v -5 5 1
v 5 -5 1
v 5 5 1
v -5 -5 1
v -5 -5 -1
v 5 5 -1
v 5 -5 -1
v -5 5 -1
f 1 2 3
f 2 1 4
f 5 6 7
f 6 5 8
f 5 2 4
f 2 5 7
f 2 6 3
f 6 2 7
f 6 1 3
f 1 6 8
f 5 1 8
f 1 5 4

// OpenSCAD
// Selftest fixture for scripts/lineage.sh — never printed, never gated as a
// design. Rendered only so `./scripts/lineage.sh selftest` can prove the
// derivative gate in scripts/gate.sh can still tell a working override from a
// silently-broken one on whatever OpenSCAD this machine has.
//
// This is an ordinary entry point, shaped like every design in designs/: it
// defines a module and calls it at the top level. It plays two parts in the
// selftest — the mesh a derivative's override has to differ from, and the
// NOT-base-safe half of the base-safety proof, since its top level emits
// geometry that a diamond would evaluate and union twice.

// Coarse on purpose: these renders exist to be hashed, not looked at, and a
// smooth cylinder would only make the selftest slower.
$fn = 8;

module lid() {
    cube([10, 10, 2], center = true);
}

lid();
